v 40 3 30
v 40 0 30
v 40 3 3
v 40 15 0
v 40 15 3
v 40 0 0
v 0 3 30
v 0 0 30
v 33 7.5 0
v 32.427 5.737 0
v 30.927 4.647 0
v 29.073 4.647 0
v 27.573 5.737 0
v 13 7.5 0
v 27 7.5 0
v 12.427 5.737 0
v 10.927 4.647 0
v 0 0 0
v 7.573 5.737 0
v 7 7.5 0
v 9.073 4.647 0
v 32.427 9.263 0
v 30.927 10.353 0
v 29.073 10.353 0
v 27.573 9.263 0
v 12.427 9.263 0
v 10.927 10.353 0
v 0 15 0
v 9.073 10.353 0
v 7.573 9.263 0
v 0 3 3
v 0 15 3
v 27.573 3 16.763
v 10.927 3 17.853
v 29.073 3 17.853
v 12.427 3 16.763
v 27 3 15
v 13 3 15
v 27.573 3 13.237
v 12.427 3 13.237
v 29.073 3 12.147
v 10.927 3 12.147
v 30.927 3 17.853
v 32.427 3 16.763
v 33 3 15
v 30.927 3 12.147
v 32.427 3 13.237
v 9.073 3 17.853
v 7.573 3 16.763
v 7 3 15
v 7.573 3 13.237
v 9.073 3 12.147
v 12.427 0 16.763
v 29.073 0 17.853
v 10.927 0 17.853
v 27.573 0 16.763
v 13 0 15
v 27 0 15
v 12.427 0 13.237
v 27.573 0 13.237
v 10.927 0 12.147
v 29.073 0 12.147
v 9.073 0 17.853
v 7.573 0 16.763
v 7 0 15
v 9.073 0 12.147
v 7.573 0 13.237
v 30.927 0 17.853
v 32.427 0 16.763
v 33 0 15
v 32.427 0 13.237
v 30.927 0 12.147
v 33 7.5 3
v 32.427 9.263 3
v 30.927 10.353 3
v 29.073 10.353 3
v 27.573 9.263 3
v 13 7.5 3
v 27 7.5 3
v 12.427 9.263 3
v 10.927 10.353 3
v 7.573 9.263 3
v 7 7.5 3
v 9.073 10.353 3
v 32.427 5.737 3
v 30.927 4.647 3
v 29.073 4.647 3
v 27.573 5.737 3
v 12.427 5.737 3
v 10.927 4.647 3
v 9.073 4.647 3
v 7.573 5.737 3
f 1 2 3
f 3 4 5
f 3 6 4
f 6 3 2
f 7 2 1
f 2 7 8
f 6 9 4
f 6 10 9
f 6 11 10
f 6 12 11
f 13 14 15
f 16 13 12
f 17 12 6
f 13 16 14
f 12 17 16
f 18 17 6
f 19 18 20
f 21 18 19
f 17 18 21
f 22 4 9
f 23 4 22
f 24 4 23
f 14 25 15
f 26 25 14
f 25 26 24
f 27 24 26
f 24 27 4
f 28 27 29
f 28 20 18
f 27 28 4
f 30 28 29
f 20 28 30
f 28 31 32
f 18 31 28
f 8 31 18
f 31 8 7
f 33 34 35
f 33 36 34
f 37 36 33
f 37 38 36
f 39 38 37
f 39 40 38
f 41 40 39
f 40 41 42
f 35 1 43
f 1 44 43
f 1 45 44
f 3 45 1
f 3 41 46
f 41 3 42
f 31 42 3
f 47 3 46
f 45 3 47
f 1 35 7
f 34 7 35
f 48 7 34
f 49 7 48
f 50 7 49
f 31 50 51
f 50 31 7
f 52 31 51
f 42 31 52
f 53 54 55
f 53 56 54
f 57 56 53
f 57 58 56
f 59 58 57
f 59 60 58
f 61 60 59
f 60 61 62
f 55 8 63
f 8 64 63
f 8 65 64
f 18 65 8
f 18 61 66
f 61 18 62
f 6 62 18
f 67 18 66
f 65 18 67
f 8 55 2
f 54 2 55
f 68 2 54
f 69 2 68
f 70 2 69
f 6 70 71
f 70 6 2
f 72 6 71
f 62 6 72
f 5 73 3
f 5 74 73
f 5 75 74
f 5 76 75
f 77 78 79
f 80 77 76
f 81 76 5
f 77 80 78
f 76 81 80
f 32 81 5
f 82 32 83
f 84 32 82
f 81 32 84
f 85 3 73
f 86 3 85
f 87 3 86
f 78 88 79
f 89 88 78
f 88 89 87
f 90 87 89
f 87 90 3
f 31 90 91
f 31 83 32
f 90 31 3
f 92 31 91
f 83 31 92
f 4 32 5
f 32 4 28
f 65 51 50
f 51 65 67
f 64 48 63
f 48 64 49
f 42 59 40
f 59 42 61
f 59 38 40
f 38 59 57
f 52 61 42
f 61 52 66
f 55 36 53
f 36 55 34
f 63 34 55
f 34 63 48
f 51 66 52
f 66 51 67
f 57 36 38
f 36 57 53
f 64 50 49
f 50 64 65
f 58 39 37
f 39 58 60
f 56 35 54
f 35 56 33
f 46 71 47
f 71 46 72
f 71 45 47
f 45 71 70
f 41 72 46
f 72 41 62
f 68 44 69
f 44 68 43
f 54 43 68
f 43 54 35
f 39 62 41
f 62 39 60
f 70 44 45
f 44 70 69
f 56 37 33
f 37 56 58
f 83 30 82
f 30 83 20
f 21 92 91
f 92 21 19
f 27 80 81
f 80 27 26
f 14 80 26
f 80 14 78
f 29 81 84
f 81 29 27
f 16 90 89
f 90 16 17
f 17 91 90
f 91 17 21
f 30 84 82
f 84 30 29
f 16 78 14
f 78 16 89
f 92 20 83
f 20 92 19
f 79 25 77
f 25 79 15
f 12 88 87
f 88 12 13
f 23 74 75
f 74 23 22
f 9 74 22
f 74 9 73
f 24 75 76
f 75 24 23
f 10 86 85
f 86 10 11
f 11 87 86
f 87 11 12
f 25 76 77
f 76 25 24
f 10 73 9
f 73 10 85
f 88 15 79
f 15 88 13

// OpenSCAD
// Parametric Bracket Example
// Demonstrates AI-assisted parametric design

// Design parameters (easily modified for different requirements)
bracket_width = 40;
bracket_height = 30;
bracket_depth = 15;
wall_thickness = 3;
hole_diameter = 6;
mounting_holes = 2;

module parametric_bracket() {
    difference() {
        // Main bracket body
        union() {
            // Vertical wall
            cube([bracket_width, wall_thickness, bracket_height]);
            
            // Horizontal base
            cube([bracket_width, bracket_depth, wall_thickness]);
            
            // Reinforcement corner
            hull() {
                cube([wall_thickness, wall_thickness, wall_thickness]);
                cube([wall_thickness, bracket_depth, wall_thickness]);
                cube([bracket_width, wall_thickness, wall_thickness]);
            }
        }
        
        // Mounting holes in vertical wall
        for (i = [0:mounting_holes-1]) {
            translate([bracket_width/2 + (i-0.5)*20, -1, bracket_height/2]) {
                rotate([-90, 0, 0]) {
                    cylinder(h=wall_thickness+2, d=hole_diameter);
                }
            }
        }
        
        // Mounting holes in base
        for (i = [0:mounting_holes-1]) {
            translate([bracket_width/2 + (i-0.5)*20, bracket_depth/2, -1]) {
                cylinder(h=wall_thickness+2, d=hole_diameter);
            }
        }
    }
}

// Generate the bracket
parametric_bracket();

// Display parameters
echo("Bracket dimensions: ", bracket_width, "x", bracket_depth, "x", bracket_height, "mm");
echo("Wall thickness: ", wall_thickness, "mm");
echo("Hole diameter: ", hole_diameter, "mm");
